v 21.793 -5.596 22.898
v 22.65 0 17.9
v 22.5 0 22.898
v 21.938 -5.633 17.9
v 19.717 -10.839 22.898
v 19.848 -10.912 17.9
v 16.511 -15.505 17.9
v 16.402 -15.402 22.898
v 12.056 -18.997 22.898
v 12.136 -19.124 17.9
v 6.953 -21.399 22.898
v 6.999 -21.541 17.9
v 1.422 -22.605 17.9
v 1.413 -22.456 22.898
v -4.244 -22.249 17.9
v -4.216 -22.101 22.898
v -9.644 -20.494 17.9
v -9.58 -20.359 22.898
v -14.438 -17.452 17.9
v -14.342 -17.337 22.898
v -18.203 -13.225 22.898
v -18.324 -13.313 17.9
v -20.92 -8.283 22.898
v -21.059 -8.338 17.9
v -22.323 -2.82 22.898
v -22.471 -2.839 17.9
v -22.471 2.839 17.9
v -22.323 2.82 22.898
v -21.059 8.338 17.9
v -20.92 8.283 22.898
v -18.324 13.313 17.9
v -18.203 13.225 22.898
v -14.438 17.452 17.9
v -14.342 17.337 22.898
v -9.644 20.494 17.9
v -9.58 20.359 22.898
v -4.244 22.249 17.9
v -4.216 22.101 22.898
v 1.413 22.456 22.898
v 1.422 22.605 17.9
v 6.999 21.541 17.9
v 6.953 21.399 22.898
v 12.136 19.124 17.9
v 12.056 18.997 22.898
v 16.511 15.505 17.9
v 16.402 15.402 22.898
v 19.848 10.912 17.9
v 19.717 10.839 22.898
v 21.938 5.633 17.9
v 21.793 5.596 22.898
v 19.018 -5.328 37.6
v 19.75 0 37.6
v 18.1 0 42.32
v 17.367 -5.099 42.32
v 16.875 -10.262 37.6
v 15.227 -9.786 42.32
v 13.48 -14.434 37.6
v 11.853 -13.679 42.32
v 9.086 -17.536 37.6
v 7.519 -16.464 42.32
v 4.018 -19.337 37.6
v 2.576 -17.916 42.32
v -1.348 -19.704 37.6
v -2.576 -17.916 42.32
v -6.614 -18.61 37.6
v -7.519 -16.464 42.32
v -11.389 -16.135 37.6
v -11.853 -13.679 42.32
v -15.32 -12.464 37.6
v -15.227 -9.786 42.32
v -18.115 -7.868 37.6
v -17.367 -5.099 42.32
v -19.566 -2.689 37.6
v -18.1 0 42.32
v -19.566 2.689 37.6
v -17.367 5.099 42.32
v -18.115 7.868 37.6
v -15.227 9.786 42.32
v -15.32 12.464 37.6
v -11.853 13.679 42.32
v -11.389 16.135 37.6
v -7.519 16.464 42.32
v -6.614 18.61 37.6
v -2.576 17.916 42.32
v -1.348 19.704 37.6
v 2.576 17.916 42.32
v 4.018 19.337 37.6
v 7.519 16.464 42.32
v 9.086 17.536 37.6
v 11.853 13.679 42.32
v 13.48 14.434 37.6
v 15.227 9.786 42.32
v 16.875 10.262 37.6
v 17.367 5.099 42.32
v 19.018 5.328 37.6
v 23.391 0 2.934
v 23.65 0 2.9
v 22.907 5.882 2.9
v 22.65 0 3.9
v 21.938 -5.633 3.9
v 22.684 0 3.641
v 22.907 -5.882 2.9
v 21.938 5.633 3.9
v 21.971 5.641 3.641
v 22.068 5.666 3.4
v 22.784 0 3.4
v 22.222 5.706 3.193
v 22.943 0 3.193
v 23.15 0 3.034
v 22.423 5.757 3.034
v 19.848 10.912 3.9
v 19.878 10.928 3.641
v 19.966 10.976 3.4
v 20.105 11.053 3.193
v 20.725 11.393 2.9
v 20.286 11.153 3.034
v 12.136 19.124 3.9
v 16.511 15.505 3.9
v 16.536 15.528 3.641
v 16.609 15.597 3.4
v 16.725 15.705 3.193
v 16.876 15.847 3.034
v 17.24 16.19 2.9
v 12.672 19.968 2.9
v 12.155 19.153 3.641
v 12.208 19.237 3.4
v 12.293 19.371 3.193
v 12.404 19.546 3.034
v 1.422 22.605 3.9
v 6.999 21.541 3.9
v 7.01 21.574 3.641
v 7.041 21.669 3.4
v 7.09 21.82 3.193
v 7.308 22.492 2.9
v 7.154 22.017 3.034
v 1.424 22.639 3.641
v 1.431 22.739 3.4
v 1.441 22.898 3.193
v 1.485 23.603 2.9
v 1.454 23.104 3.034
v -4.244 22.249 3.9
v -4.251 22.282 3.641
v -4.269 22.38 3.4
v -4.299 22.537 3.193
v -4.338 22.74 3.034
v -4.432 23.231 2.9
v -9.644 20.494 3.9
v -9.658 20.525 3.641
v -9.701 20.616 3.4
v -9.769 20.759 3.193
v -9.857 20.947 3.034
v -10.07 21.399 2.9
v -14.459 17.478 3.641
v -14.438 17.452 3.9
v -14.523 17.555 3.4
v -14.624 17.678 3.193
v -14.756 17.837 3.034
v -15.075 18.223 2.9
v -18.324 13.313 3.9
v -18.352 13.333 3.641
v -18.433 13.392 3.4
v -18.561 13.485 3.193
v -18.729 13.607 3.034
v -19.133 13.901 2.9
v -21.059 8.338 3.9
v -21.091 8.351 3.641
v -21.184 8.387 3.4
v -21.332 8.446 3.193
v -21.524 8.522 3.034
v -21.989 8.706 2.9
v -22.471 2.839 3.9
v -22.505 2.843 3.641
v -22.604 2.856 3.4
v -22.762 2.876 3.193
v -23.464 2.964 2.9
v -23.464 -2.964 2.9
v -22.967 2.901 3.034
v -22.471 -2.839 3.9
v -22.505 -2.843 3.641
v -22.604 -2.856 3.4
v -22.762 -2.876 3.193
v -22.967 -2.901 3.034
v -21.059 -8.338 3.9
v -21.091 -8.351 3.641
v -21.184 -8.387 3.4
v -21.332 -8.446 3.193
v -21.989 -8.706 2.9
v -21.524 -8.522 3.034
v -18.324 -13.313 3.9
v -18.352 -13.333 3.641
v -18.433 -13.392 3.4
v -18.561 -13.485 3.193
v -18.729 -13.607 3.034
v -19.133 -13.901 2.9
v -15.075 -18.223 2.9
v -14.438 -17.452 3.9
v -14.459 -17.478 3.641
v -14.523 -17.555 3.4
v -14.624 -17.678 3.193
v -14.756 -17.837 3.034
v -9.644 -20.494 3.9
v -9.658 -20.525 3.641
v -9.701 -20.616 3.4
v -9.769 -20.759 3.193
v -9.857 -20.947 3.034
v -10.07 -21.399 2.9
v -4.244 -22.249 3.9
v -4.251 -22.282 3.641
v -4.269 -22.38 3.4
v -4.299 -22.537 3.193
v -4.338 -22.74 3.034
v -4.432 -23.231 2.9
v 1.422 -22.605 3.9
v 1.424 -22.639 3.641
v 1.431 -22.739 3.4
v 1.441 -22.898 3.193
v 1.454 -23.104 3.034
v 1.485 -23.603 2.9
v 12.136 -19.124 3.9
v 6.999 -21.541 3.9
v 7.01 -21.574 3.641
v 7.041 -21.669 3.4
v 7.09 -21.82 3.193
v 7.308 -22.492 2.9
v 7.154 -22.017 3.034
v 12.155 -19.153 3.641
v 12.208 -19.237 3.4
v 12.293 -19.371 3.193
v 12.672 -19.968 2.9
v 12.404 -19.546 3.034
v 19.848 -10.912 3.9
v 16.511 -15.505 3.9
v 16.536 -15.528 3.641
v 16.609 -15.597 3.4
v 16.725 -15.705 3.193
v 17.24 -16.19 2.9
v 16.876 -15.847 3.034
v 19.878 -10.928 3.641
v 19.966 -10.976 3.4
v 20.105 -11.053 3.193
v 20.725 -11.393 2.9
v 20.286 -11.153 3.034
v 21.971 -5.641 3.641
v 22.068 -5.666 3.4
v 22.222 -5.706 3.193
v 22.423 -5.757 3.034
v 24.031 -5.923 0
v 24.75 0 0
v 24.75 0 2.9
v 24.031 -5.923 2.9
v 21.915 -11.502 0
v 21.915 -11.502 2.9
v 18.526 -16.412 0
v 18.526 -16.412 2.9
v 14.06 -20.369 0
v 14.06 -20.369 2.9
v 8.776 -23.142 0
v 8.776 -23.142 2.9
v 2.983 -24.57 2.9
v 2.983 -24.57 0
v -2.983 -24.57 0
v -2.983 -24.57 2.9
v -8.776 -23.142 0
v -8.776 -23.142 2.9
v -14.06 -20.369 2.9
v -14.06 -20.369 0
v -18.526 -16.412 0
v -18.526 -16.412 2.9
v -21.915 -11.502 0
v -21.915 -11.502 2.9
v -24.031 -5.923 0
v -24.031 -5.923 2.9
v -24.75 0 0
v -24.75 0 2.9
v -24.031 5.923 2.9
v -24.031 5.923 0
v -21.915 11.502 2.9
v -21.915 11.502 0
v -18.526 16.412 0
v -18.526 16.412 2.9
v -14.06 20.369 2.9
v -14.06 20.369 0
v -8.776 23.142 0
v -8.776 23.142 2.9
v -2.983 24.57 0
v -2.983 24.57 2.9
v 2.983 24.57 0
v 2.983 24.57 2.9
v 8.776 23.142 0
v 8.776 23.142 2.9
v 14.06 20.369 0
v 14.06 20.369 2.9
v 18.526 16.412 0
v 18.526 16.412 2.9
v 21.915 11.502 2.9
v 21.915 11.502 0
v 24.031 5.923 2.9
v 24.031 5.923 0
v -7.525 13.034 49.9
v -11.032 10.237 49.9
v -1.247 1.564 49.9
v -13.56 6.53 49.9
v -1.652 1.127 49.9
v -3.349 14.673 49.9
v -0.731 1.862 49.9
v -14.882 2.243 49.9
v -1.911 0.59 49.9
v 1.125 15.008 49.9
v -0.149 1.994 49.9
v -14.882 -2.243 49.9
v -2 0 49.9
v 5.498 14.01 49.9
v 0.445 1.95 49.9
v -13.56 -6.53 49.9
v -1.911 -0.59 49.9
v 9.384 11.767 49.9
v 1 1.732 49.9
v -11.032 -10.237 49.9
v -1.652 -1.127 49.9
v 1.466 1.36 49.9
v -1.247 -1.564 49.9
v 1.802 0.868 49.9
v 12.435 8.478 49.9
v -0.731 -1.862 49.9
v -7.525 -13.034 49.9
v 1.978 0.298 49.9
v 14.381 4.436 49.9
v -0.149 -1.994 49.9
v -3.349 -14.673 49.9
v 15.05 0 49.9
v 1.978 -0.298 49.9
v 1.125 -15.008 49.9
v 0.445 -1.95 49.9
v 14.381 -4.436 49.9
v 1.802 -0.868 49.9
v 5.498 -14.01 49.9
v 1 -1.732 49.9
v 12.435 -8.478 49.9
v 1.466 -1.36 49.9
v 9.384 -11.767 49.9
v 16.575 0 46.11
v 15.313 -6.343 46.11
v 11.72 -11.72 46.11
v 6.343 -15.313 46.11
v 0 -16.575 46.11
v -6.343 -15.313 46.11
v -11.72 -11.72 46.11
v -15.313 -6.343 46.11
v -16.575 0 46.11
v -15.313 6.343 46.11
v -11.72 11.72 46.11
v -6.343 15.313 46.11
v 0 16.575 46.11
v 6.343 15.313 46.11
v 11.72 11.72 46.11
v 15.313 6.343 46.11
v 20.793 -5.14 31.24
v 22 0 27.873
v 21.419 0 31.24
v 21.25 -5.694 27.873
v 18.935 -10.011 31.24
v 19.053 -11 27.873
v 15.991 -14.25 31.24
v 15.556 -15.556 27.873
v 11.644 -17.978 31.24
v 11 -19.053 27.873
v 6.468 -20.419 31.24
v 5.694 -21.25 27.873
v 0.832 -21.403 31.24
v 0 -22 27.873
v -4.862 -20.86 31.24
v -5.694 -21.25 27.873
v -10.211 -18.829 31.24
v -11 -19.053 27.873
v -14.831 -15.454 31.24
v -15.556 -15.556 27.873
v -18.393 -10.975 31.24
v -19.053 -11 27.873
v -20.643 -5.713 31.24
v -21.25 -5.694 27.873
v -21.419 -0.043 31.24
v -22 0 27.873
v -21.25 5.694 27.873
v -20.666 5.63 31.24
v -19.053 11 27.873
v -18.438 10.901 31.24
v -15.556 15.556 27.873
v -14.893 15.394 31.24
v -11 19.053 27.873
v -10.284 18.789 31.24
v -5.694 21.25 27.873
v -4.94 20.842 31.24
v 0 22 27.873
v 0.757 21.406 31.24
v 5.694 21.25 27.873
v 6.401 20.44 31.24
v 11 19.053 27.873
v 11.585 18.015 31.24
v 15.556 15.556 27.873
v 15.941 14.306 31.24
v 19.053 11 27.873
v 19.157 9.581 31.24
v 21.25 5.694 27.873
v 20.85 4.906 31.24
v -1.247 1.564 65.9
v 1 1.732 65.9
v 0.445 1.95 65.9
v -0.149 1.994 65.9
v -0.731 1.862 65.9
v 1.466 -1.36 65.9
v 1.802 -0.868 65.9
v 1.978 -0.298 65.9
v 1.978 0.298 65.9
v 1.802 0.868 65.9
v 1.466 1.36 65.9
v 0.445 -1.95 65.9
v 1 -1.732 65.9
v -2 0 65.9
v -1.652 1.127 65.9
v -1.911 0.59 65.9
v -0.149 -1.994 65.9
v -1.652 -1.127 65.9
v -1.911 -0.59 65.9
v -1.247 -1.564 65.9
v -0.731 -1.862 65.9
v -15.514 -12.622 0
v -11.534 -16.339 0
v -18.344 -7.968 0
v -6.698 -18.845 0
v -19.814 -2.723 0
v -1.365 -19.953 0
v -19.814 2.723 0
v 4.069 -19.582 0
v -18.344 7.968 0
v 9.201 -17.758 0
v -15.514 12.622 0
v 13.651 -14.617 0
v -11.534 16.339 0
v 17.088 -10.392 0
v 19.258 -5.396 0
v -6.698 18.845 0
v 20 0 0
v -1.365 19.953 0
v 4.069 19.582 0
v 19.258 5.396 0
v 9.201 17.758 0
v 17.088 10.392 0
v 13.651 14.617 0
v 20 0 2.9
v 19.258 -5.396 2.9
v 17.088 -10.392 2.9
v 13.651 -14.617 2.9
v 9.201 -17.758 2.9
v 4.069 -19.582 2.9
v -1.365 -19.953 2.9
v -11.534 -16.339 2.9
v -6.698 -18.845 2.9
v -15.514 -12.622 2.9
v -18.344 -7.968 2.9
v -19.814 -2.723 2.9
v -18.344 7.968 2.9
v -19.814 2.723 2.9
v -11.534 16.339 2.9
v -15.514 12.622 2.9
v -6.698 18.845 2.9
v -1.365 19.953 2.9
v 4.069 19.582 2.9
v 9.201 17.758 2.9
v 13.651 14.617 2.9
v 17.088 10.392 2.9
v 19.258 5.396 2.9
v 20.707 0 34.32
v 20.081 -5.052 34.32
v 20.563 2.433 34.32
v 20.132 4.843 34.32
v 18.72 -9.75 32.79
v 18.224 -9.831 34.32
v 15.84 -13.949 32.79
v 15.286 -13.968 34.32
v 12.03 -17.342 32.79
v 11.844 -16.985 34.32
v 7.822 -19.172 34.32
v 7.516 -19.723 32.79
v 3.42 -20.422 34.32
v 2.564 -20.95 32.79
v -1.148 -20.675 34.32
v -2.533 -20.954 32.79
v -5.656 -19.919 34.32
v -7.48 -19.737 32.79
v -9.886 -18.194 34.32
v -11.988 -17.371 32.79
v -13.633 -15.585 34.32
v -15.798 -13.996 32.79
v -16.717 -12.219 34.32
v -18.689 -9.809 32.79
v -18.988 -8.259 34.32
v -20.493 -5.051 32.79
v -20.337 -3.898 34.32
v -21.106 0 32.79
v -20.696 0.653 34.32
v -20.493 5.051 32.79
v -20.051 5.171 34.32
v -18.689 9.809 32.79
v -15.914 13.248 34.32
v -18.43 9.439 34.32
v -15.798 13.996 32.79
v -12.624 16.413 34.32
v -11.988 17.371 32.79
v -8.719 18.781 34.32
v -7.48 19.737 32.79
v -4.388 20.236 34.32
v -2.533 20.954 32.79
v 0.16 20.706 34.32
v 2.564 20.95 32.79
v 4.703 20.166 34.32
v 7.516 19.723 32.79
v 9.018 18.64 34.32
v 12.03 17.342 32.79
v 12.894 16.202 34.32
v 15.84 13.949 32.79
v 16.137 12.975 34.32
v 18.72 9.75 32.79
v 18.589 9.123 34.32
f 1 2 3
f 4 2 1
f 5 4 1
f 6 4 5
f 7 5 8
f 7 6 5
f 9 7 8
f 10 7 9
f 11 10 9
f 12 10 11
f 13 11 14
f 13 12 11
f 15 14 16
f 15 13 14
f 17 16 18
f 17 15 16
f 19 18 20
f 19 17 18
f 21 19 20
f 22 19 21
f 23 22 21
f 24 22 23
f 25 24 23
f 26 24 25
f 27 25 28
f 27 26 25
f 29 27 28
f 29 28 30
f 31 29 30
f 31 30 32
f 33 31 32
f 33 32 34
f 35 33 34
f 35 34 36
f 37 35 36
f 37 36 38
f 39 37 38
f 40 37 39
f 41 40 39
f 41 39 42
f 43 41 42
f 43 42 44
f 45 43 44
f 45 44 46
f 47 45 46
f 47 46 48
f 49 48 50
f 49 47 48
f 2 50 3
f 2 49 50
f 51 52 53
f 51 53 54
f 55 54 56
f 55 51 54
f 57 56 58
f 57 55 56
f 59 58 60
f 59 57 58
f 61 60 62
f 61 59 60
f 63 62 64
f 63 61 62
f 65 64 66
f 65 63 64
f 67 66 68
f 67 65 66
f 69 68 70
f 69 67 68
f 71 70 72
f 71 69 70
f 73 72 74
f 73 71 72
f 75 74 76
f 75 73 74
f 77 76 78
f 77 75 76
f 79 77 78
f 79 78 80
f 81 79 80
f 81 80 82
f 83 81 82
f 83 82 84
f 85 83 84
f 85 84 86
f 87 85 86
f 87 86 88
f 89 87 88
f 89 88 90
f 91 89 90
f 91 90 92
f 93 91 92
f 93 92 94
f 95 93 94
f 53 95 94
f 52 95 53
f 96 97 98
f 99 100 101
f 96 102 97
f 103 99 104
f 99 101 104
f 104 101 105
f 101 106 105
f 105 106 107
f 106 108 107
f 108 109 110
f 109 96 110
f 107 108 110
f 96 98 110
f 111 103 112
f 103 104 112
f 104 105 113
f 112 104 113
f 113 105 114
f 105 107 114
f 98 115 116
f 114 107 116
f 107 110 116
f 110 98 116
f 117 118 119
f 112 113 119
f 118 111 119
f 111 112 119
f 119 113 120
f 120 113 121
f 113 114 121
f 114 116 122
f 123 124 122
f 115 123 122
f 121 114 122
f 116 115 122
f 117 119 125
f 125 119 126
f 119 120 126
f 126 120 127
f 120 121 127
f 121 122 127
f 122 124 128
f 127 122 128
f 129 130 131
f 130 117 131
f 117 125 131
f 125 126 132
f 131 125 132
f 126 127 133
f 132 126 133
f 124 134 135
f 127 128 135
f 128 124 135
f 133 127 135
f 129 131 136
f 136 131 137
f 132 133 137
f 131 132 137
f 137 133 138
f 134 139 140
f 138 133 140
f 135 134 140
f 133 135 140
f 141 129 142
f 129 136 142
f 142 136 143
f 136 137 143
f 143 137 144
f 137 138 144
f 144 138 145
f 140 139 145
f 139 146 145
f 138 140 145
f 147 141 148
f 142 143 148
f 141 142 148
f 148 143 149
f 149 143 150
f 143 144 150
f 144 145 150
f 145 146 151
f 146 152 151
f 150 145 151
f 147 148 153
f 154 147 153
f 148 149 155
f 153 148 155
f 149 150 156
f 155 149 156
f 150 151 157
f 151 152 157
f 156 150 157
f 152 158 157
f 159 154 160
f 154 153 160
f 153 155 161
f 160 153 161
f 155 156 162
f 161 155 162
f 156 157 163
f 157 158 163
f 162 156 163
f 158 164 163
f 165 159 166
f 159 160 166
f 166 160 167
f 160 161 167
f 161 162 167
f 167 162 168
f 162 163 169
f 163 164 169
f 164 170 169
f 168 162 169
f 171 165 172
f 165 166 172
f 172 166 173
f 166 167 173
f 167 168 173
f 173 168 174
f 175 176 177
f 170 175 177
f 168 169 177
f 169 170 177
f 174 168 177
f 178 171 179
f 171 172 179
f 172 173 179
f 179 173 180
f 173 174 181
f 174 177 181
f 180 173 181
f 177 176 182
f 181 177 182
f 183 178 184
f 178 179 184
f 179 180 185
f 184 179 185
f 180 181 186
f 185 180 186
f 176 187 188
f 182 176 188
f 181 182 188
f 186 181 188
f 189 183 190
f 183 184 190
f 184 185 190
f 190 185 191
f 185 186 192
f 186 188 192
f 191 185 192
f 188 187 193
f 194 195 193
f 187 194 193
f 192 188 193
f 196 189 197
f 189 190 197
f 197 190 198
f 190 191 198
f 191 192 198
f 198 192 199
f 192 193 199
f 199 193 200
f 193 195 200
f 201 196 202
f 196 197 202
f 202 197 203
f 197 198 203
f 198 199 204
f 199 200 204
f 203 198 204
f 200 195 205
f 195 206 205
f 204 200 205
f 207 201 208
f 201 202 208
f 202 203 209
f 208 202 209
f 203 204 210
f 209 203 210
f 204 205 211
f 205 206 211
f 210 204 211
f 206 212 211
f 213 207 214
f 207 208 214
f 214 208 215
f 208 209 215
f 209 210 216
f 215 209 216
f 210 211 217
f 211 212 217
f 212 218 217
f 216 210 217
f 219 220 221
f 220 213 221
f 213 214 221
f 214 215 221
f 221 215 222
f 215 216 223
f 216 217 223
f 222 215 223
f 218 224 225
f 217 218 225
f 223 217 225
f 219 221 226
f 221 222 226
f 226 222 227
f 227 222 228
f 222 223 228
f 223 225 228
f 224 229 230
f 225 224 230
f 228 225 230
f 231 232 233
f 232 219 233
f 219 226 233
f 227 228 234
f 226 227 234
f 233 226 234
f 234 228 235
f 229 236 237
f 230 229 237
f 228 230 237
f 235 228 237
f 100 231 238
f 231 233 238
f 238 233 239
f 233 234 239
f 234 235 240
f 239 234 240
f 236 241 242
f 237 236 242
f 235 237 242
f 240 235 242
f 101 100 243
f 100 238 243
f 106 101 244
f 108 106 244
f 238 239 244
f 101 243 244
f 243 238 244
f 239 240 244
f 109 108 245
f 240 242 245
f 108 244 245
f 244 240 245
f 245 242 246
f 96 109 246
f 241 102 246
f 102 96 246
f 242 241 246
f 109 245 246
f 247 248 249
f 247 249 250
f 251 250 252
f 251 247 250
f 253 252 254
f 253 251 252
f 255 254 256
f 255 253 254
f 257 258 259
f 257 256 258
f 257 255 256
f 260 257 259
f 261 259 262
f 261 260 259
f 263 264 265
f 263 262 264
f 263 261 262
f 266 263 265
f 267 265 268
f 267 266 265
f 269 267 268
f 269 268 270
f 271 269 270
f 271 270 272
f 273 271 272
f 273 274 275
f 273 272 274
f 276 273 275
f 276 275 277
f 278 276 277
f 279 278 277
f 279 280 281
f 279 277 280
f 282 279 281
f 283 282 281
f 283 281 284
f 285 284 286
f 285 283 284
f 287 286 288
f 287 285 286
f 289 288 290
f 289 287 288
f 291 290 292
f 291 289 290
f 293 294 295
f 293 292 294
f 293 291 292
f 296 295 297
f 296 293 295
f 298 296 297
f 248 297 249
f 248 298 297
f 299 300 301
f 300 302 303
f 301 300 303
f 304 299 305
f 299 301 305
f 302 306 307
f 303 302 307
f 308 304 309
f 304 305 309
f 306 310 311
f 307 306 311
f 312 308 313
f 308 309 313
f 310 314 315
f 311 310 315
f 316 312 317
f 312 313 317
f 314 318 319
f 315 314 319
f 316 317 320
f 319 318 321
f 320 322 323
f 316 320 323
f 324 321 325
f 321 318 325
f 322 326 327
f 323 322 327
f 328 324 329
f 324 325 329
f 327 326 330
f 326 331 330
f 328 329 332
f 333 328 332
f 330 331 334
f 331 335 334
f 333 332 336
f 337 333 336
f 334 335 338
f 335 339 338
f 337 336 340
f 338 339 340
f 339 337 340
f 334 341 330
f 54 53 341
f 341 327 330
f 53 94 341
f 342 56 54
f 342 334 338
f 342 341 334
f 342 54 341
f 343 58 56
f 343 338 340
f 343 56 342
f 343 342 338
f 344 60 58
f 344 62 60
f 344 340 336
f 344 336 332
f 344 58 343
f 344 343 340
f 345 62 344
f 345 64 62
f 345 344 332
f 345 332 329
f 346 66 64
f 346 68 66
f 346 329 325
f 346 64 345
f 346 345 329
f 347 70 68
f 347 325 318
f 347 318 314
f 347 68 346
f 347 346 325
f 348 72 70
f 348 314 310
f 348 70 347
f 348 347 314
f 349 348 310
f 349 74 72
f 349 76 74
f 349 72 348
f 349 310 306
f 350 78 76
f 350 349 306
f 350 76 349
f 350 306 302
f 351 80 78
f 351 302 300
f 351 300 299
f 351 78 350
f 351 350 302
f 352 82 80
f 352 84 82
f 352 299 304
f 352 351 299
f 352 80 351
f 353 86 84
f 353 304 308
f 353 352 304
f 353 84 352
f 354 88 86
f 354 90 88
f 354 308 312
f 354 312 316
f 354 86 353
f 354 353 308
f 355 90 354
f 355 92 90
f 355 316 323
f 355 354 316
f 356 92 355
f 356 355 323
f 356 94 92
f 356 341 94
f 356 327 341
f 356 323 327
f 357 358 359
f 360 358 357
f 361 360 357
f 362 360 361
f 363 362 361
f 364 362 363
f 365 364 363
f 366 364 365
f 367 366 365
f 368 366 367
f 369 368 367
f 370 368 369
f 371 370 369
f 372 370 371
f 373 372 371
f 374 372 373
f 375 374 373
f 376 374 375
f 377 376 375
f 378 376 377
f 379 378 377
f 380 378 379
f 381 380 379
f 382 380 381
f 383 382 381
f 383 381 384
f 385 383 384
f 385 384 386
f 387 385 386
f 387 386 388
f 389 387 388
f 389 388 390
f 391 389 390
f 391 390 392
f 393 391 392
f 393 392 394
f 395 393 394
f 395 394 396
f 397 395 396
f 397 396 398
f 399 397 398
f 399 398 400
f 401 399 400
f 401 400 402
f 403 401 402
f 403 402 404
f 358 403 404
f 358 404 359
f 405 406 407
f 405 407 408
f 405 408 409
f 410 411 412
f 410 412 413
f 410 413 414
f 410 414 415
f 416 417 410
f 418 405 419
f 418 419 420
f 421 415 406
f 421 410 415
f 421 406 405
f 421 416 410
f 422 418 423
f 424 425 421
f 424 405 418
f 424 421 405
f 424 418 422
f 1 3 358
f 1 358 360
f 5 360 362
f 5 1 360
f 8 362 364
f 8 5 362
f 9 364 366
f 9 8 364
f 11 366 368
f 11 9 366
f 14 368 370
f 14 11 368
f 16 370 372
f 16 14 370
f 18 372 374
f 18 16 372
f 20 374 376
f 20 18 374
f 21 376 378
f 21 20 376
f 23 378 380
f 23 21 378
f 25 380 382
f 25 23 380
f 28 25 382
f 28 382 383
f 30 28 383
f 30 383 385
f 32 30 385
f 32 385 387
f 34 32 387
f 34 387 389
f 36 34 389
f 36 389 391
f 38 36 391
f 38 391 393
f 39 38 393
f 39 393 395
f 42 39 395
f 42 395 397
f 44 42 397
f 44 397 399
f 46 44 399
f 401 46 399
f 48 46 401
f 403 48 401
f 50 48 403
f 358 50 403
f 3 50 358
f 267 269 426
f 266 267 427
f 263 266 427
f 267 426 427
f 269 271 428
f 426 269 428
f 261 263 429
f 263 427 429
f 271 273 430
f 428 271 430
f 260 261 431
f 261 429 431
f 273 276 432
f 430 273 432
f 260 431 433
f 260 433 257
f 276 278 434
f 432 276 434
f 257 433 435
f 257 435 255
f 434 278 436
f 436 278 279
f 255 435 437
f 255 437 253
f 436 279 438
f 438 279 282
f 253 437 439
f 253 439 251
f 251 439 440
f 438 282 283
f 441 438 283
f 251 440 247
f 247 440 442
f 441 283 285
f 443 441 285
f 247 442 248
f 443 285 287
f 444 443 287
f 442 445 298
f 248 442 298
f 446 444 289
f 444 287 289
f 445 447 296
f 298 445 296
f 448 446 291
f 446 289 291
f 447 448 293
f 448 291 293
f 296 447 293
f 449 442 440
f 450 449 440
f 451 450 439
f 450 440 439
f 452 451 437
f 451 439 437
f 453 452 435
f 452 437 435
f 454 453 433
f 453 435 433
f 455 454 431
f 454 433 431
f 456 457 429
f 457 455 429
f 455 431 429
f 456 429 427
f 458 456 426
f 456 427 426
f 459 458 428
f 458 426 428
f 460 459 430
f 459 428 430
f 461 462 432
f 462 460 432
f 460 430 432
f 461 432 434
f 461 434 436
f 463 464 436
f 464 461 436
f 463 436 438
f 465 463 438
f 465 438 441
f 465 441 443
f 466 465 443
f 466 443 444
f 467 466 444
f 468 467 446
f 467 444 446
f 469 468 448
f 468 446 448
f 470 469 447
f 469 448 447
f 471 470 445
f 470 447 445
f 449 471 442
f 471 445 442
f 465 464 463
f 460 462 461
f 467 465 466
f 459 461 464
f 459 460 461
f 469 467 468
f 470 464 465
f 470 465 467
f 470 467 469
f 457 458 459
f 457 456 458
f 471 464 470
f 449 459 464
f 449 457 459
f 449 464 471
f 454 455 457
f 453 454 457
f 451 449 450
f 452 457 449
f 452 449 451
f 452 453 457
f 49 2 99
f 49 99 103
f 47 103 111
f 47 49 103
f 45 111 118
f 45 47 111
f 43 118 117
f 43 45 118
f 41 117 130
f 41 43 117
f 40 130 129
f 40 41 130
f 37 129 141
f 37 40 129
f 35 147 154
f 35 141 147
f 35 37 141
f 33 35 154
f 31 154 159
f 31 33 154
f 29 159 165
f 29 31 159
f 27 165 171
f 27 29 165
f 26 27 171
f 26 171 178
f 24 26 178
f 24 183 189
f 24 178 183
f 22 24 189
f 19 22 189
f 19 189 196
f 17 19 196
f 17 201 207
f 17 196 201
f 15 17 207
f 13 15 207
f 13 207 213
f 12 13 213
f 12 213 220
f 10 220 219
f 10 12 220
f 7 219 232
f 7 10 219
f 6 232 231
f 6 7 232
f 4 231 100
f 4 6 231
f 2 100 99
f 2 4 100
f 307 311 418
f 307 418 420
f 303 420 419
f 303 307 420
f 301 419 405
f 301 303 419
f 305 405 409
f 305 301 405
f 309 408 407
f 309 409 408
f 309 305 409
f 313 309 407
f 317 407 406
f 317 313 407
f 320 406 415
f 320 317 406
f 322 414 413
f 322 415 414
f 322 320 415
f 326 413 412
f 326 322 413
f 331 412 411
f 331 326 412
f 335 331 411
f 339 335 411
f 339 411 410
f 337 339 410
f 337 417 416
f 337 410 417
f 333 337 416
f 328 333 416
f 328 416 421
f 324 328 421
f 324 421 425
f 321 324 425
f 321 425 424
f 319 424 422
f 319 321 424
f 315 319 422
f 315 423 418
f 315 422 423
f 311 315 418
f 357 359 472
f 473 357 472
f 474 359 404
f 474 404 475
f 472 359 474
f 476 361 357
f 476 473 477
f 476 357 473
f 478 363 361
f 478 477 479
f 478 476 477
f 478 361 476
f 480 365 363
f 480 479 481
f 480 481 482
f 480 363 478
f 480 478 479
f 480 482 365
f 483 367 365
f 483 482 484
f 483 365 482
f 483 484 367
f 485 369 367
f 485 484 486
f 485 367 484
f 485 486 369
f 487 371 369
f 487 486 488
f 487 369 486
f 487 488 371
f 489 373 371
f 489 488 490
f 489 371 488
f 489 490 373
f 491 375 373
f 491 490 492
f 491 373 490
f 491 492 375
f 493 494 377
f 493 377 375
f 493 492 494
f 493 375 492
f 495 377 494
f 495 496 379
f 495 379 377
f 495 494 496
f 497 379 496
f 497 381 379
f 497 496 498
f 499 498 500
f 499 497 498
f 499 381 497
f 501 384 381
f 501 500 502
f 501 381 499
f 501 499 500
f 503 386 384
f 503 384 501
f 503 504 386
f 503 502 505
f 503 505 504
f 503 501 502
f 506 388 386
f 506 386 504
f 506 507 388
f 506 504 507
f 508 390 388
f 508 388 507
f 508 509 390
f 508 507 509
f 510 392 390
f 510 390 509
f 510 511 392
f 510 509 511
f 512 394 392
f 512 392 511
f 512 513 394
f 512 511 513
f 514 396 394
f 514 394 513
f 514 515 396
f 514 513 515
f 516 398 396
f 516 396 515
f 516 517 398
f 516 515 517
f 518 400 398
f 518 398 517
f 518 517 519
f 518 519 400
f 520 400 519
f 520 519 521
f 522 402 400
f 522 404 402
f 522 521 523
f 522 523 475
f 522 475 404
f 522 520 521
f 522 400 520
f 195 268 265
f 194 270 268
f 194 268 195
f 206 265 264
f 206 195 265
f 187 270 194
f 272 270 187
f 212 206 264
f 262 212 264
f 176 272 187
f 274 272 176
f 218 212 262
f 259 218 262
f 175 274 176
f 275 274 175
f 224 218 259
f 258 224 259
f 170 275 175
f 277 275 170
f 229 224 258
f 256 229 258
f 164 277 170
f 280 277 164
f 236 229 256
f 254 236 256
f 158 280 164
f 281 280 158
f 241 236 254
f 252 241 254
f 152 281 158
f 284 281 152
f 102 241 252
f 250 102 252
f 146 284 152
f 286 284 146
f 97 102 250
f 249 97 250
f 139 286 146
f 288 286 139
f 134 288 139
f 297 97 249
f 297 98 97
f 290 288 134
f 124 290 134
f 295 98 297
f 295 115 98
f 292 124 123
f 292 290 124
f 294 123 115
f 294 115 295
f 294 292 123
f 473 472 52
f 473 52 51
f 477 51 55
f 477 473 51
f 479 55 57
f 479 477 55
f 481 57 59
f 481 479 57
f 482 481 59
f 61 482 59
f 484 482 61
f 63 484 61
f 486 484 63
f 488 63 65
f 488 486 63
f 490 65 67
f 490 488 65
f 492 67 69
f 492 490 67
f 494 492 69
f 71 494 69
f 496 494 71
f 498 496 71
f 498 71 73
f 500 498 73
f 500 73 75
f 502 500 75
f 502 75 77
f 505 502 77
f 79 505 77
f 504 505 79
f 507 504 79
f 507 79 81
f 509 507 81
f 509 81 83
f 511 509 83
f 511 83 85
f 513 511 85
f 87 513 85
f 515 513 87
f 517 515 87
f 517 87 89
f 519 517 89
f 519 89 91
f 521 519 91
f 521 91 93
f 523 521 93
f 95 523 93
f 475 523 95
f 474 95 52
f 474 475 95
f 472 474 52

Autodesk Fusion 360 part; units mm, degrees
sketch "Skizze1" plane through (0, 0, 0) normal (0, 0, 1) x (1, 0, 0)
  circle A0 centre (0, 0) radius 24.75
  circle A1 centre (0, 0) radius 20
  dimension "d1" = 49.5
  dimension "d4" = 40
extrude "Extrusion1" add sketch "Skizze1" along normal blind 2.9
sketch "Skizze2" plane through (0, 0, 0) normal (0, 1, 0) x (1, 0, 0)
  line L0 (-24.75, -2.9) -> (24.75, -2.9)
  line L1 (-24.75, 0) -> (24.75, 0)
  line L2 (22.65, -2.9) -> (22.65, -7.9)
  line L3 (22.65, -7.9) -> (22.65, -12.9)
  line L4 (22.65, -12.9) -> (22.65, -17.9)
  line L5 (22.65, -17.9) -> (22.5, -22.8977)
  line L6 (22.5, -22.8977) -> (22, -27.8727)
  line L7 (22, -27.8727) -> (21.15, -32.7999)
  line L8 (21.15, -32.7999) -> (19.75, -37.5999)
  line L9 (19.75, -37.5999) -> (18.1, -42.3198)
  line L10 (0, -2.9) -> (0, -41.75) construction
  line L11 (18.1, -42.3198) -> (15.05, -49.9)
  line L12 (15.05, -49.9) -> (0, -49.9)
  line L13 (0, -49.9) -> (0, -2.9)
  dimension "d6" = 5
  dimension "d8" = 22.65
  dimension "d9" = 22.65
  dimension "d10" = 22.65
  dimension "d11" = 22.65
  dimension "d12" = 22.5
  dimension "d13" = 22
  dimension "d14" = 21.15
  dimension "d15" = 19.75
  dimension "d17" = 18.1
  dimension "d18" = 47
  dimension "d20" = 15.05
  dimension "d21" = 8.1708
  dimension "d22" = 7.5802
revolve "Drehen1" add sketch "Skizze2" angle 360 about axis through (0, 0, 49.9) along (0, 0, -1)
fillet "Abrundung1" radius 28 6 edges at (-16.8751, -6.5452, 42.3198) (-18.4135, -7.1419, 37.5999) (-19.7187, -7.6482, 32.7999) (-20.5112, -7.9555, 27.8727) (-20.9774, -8.1363, 22.8977) (-21.1172, -8.1906, 17.9)
fillet "Abrundung2" radius 1 1 edges at (-21.1172, 8.1906, 2.9)
sketch "Skizze3" plane through (0, 0, 49.9) normal (0, 0, 1) x (-1, 0, 0)
  circle A0 centre (0, 0) radius 15.05
  circle A1 centre (0, 0) radius 2
  dimension "d28" = 4
extrude "Extrusion2" add sketch "Skizze3" along normal blind 16 contours A1
equation "d8 = ( 45.3 / 2 ) * 1 mm"
equation "d9 = ( 45.3 / 2 ) * 1 mm"
equation "d10 = ( 45.3 / 2 ) * 1 mm"
equation "d11 = ( 45.3 / 2 ) * 1 mm"
equation "d12 = ( 45.0 / 2 ) * 1 mm"
equation "d13 = ( 44 / 2 ) * 1 mm"
equation "d14 = ( 42.3 / 2 ) * 1 mm"
equation "d15 = ( 39.5 / 2 ) * 1 mm"
equation "d17 = ( 36.2 / 2 ) * 1 mm"
equation "d20 = ( 30.1 / 2 ) * 1 mm"
